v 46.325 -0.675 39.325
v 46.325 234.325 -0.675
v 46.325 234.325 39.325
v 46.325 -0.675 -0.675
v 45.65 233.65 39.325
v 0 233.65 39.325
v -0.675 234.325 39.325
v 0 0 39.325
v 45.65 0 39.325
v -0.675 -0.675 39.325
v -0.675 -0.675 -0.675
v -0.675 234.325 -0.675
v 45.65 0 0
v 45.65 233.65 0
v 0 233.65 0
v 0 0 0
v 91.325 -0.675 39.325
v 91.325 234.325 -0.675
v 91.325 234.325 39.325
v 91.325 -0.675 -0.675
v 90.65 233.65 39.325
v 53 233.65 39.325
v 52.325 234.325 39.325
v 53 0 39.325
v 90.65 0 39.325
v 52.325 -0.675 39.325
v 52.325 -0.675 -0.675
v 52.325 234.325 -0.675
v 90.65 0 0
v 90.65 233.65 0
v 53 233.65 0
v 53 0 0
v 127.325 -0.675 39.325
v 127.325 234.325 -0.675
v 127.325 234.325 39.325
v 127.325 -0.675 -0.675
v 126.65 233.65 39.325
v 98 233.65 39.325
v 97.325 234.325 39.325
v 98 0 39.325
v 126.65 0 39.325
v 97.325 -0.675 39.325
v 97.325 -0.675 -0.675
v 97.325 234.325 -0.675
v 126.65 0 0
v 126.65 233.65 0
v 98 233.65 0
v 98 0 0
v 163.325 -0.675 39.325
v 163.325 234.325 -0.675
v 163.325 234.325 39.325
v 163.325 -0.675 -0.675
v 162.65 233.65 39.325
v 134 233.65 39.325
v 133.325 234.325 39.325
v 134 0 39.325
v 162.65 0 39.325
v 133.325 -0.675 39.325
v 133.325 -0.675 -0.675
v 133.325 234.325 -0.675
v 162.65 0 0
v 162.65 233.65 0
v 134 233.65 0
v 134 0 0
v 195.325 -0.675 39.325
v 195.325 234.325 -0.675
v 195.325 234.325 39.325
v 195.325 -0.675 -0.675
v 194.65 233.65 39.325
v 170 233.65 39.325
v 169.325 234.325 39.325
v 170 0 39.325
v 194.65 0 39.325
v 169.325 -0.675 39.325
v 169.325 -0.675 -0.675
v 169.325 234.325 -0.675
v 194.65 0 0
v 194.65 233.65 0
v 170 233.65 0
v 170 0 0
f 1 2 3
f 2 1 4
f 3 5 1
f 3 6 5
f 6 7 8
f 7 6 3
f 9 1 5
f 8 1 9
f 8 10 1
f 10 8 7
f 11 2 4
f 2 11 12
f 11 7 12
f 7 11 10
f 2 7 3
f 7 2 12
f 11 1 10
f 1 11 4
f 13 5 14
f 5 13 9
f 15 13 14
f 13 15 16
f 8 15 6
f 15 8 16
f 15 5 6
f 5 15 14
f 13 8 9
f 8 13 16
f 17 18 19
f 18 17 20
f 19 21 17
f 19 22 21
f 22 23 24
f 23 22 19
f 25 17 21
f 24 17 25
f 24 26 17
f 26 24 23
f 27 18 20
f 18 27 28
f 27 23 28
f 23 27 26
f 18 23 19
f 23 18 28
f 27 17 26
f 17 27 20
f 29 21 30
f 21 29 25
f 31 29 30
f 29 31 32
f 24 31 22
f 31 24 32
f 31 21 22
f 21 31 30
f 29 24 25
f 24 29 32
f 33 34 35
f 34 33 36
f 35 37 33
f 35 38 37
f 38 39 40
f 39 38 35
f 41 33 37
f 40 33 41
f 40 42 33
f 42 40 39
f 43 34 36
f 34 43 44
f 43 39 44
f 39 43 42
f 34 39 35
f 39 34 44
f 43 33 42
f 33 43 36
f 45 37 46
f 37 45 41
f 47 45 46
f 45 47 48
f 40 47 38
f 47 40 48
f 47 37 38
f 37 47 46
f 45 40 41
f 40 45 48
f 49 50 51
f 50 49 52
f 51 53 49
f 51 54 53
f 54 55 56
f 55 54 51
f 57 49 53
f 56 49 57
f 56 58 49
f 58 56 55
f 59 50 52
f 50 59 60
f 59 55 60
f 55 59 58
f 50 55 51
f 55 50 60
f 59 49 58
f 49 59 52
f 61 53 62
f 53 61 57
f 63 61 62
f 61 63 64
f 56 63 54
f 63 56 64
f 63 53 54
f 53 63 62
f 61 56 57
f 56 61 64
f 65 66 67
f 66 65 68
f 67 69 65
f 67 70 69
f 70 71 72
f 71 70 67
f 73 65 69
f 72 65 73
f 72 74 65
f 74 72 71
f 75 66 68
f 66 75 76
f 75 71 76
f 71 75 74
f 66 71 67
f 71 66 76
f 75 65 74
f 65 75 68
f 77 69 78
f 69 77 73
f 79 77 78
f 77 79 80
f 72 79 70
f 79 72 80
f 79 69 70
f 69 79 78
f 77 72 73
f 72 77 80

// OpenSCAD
$fa =.01;
$fs = 1;

width = 175-3;
length=230;
height=40;
widths = [42, 34, 25, 25, 21];
twt=.675;
function sum(x) = x * [for(i=[1:len(x)]) 1];
function cumsum(values, zero) = [for (a = 0, b = values[0]; a < len(values); a = a + 1, b = b + (values[a] == undef?zero:values[a])) b];

max_sum_widths = width - twt * 2 * len(widths);


if(sum(widths) > max_sum_widths){
    color("red") text("error", size=100);
} else {
    slop = (max_sum_widths - sum(widths))/ len(widths);
    widened_widths = [for(x = widths) x + slop ];

    cum_widths = cumsum(widened_widths, 0);

    offsets = [for ( i = [0:len(cum_widths)-1]) cum_widths[i] - widened_widths[i] + i * (6 + 2 * twt)];
    for(i = [0:len(widened_widths)-1]){
        translate([offsets[i],0,0])  difference(){
            translate([-twt,-twt,-twt]) cube([widened_widths[i] + 2*twt, length + slop + 2*twt, height]);
            cube([widened_widths[i],length + slop,height]);
        }
    }
}
